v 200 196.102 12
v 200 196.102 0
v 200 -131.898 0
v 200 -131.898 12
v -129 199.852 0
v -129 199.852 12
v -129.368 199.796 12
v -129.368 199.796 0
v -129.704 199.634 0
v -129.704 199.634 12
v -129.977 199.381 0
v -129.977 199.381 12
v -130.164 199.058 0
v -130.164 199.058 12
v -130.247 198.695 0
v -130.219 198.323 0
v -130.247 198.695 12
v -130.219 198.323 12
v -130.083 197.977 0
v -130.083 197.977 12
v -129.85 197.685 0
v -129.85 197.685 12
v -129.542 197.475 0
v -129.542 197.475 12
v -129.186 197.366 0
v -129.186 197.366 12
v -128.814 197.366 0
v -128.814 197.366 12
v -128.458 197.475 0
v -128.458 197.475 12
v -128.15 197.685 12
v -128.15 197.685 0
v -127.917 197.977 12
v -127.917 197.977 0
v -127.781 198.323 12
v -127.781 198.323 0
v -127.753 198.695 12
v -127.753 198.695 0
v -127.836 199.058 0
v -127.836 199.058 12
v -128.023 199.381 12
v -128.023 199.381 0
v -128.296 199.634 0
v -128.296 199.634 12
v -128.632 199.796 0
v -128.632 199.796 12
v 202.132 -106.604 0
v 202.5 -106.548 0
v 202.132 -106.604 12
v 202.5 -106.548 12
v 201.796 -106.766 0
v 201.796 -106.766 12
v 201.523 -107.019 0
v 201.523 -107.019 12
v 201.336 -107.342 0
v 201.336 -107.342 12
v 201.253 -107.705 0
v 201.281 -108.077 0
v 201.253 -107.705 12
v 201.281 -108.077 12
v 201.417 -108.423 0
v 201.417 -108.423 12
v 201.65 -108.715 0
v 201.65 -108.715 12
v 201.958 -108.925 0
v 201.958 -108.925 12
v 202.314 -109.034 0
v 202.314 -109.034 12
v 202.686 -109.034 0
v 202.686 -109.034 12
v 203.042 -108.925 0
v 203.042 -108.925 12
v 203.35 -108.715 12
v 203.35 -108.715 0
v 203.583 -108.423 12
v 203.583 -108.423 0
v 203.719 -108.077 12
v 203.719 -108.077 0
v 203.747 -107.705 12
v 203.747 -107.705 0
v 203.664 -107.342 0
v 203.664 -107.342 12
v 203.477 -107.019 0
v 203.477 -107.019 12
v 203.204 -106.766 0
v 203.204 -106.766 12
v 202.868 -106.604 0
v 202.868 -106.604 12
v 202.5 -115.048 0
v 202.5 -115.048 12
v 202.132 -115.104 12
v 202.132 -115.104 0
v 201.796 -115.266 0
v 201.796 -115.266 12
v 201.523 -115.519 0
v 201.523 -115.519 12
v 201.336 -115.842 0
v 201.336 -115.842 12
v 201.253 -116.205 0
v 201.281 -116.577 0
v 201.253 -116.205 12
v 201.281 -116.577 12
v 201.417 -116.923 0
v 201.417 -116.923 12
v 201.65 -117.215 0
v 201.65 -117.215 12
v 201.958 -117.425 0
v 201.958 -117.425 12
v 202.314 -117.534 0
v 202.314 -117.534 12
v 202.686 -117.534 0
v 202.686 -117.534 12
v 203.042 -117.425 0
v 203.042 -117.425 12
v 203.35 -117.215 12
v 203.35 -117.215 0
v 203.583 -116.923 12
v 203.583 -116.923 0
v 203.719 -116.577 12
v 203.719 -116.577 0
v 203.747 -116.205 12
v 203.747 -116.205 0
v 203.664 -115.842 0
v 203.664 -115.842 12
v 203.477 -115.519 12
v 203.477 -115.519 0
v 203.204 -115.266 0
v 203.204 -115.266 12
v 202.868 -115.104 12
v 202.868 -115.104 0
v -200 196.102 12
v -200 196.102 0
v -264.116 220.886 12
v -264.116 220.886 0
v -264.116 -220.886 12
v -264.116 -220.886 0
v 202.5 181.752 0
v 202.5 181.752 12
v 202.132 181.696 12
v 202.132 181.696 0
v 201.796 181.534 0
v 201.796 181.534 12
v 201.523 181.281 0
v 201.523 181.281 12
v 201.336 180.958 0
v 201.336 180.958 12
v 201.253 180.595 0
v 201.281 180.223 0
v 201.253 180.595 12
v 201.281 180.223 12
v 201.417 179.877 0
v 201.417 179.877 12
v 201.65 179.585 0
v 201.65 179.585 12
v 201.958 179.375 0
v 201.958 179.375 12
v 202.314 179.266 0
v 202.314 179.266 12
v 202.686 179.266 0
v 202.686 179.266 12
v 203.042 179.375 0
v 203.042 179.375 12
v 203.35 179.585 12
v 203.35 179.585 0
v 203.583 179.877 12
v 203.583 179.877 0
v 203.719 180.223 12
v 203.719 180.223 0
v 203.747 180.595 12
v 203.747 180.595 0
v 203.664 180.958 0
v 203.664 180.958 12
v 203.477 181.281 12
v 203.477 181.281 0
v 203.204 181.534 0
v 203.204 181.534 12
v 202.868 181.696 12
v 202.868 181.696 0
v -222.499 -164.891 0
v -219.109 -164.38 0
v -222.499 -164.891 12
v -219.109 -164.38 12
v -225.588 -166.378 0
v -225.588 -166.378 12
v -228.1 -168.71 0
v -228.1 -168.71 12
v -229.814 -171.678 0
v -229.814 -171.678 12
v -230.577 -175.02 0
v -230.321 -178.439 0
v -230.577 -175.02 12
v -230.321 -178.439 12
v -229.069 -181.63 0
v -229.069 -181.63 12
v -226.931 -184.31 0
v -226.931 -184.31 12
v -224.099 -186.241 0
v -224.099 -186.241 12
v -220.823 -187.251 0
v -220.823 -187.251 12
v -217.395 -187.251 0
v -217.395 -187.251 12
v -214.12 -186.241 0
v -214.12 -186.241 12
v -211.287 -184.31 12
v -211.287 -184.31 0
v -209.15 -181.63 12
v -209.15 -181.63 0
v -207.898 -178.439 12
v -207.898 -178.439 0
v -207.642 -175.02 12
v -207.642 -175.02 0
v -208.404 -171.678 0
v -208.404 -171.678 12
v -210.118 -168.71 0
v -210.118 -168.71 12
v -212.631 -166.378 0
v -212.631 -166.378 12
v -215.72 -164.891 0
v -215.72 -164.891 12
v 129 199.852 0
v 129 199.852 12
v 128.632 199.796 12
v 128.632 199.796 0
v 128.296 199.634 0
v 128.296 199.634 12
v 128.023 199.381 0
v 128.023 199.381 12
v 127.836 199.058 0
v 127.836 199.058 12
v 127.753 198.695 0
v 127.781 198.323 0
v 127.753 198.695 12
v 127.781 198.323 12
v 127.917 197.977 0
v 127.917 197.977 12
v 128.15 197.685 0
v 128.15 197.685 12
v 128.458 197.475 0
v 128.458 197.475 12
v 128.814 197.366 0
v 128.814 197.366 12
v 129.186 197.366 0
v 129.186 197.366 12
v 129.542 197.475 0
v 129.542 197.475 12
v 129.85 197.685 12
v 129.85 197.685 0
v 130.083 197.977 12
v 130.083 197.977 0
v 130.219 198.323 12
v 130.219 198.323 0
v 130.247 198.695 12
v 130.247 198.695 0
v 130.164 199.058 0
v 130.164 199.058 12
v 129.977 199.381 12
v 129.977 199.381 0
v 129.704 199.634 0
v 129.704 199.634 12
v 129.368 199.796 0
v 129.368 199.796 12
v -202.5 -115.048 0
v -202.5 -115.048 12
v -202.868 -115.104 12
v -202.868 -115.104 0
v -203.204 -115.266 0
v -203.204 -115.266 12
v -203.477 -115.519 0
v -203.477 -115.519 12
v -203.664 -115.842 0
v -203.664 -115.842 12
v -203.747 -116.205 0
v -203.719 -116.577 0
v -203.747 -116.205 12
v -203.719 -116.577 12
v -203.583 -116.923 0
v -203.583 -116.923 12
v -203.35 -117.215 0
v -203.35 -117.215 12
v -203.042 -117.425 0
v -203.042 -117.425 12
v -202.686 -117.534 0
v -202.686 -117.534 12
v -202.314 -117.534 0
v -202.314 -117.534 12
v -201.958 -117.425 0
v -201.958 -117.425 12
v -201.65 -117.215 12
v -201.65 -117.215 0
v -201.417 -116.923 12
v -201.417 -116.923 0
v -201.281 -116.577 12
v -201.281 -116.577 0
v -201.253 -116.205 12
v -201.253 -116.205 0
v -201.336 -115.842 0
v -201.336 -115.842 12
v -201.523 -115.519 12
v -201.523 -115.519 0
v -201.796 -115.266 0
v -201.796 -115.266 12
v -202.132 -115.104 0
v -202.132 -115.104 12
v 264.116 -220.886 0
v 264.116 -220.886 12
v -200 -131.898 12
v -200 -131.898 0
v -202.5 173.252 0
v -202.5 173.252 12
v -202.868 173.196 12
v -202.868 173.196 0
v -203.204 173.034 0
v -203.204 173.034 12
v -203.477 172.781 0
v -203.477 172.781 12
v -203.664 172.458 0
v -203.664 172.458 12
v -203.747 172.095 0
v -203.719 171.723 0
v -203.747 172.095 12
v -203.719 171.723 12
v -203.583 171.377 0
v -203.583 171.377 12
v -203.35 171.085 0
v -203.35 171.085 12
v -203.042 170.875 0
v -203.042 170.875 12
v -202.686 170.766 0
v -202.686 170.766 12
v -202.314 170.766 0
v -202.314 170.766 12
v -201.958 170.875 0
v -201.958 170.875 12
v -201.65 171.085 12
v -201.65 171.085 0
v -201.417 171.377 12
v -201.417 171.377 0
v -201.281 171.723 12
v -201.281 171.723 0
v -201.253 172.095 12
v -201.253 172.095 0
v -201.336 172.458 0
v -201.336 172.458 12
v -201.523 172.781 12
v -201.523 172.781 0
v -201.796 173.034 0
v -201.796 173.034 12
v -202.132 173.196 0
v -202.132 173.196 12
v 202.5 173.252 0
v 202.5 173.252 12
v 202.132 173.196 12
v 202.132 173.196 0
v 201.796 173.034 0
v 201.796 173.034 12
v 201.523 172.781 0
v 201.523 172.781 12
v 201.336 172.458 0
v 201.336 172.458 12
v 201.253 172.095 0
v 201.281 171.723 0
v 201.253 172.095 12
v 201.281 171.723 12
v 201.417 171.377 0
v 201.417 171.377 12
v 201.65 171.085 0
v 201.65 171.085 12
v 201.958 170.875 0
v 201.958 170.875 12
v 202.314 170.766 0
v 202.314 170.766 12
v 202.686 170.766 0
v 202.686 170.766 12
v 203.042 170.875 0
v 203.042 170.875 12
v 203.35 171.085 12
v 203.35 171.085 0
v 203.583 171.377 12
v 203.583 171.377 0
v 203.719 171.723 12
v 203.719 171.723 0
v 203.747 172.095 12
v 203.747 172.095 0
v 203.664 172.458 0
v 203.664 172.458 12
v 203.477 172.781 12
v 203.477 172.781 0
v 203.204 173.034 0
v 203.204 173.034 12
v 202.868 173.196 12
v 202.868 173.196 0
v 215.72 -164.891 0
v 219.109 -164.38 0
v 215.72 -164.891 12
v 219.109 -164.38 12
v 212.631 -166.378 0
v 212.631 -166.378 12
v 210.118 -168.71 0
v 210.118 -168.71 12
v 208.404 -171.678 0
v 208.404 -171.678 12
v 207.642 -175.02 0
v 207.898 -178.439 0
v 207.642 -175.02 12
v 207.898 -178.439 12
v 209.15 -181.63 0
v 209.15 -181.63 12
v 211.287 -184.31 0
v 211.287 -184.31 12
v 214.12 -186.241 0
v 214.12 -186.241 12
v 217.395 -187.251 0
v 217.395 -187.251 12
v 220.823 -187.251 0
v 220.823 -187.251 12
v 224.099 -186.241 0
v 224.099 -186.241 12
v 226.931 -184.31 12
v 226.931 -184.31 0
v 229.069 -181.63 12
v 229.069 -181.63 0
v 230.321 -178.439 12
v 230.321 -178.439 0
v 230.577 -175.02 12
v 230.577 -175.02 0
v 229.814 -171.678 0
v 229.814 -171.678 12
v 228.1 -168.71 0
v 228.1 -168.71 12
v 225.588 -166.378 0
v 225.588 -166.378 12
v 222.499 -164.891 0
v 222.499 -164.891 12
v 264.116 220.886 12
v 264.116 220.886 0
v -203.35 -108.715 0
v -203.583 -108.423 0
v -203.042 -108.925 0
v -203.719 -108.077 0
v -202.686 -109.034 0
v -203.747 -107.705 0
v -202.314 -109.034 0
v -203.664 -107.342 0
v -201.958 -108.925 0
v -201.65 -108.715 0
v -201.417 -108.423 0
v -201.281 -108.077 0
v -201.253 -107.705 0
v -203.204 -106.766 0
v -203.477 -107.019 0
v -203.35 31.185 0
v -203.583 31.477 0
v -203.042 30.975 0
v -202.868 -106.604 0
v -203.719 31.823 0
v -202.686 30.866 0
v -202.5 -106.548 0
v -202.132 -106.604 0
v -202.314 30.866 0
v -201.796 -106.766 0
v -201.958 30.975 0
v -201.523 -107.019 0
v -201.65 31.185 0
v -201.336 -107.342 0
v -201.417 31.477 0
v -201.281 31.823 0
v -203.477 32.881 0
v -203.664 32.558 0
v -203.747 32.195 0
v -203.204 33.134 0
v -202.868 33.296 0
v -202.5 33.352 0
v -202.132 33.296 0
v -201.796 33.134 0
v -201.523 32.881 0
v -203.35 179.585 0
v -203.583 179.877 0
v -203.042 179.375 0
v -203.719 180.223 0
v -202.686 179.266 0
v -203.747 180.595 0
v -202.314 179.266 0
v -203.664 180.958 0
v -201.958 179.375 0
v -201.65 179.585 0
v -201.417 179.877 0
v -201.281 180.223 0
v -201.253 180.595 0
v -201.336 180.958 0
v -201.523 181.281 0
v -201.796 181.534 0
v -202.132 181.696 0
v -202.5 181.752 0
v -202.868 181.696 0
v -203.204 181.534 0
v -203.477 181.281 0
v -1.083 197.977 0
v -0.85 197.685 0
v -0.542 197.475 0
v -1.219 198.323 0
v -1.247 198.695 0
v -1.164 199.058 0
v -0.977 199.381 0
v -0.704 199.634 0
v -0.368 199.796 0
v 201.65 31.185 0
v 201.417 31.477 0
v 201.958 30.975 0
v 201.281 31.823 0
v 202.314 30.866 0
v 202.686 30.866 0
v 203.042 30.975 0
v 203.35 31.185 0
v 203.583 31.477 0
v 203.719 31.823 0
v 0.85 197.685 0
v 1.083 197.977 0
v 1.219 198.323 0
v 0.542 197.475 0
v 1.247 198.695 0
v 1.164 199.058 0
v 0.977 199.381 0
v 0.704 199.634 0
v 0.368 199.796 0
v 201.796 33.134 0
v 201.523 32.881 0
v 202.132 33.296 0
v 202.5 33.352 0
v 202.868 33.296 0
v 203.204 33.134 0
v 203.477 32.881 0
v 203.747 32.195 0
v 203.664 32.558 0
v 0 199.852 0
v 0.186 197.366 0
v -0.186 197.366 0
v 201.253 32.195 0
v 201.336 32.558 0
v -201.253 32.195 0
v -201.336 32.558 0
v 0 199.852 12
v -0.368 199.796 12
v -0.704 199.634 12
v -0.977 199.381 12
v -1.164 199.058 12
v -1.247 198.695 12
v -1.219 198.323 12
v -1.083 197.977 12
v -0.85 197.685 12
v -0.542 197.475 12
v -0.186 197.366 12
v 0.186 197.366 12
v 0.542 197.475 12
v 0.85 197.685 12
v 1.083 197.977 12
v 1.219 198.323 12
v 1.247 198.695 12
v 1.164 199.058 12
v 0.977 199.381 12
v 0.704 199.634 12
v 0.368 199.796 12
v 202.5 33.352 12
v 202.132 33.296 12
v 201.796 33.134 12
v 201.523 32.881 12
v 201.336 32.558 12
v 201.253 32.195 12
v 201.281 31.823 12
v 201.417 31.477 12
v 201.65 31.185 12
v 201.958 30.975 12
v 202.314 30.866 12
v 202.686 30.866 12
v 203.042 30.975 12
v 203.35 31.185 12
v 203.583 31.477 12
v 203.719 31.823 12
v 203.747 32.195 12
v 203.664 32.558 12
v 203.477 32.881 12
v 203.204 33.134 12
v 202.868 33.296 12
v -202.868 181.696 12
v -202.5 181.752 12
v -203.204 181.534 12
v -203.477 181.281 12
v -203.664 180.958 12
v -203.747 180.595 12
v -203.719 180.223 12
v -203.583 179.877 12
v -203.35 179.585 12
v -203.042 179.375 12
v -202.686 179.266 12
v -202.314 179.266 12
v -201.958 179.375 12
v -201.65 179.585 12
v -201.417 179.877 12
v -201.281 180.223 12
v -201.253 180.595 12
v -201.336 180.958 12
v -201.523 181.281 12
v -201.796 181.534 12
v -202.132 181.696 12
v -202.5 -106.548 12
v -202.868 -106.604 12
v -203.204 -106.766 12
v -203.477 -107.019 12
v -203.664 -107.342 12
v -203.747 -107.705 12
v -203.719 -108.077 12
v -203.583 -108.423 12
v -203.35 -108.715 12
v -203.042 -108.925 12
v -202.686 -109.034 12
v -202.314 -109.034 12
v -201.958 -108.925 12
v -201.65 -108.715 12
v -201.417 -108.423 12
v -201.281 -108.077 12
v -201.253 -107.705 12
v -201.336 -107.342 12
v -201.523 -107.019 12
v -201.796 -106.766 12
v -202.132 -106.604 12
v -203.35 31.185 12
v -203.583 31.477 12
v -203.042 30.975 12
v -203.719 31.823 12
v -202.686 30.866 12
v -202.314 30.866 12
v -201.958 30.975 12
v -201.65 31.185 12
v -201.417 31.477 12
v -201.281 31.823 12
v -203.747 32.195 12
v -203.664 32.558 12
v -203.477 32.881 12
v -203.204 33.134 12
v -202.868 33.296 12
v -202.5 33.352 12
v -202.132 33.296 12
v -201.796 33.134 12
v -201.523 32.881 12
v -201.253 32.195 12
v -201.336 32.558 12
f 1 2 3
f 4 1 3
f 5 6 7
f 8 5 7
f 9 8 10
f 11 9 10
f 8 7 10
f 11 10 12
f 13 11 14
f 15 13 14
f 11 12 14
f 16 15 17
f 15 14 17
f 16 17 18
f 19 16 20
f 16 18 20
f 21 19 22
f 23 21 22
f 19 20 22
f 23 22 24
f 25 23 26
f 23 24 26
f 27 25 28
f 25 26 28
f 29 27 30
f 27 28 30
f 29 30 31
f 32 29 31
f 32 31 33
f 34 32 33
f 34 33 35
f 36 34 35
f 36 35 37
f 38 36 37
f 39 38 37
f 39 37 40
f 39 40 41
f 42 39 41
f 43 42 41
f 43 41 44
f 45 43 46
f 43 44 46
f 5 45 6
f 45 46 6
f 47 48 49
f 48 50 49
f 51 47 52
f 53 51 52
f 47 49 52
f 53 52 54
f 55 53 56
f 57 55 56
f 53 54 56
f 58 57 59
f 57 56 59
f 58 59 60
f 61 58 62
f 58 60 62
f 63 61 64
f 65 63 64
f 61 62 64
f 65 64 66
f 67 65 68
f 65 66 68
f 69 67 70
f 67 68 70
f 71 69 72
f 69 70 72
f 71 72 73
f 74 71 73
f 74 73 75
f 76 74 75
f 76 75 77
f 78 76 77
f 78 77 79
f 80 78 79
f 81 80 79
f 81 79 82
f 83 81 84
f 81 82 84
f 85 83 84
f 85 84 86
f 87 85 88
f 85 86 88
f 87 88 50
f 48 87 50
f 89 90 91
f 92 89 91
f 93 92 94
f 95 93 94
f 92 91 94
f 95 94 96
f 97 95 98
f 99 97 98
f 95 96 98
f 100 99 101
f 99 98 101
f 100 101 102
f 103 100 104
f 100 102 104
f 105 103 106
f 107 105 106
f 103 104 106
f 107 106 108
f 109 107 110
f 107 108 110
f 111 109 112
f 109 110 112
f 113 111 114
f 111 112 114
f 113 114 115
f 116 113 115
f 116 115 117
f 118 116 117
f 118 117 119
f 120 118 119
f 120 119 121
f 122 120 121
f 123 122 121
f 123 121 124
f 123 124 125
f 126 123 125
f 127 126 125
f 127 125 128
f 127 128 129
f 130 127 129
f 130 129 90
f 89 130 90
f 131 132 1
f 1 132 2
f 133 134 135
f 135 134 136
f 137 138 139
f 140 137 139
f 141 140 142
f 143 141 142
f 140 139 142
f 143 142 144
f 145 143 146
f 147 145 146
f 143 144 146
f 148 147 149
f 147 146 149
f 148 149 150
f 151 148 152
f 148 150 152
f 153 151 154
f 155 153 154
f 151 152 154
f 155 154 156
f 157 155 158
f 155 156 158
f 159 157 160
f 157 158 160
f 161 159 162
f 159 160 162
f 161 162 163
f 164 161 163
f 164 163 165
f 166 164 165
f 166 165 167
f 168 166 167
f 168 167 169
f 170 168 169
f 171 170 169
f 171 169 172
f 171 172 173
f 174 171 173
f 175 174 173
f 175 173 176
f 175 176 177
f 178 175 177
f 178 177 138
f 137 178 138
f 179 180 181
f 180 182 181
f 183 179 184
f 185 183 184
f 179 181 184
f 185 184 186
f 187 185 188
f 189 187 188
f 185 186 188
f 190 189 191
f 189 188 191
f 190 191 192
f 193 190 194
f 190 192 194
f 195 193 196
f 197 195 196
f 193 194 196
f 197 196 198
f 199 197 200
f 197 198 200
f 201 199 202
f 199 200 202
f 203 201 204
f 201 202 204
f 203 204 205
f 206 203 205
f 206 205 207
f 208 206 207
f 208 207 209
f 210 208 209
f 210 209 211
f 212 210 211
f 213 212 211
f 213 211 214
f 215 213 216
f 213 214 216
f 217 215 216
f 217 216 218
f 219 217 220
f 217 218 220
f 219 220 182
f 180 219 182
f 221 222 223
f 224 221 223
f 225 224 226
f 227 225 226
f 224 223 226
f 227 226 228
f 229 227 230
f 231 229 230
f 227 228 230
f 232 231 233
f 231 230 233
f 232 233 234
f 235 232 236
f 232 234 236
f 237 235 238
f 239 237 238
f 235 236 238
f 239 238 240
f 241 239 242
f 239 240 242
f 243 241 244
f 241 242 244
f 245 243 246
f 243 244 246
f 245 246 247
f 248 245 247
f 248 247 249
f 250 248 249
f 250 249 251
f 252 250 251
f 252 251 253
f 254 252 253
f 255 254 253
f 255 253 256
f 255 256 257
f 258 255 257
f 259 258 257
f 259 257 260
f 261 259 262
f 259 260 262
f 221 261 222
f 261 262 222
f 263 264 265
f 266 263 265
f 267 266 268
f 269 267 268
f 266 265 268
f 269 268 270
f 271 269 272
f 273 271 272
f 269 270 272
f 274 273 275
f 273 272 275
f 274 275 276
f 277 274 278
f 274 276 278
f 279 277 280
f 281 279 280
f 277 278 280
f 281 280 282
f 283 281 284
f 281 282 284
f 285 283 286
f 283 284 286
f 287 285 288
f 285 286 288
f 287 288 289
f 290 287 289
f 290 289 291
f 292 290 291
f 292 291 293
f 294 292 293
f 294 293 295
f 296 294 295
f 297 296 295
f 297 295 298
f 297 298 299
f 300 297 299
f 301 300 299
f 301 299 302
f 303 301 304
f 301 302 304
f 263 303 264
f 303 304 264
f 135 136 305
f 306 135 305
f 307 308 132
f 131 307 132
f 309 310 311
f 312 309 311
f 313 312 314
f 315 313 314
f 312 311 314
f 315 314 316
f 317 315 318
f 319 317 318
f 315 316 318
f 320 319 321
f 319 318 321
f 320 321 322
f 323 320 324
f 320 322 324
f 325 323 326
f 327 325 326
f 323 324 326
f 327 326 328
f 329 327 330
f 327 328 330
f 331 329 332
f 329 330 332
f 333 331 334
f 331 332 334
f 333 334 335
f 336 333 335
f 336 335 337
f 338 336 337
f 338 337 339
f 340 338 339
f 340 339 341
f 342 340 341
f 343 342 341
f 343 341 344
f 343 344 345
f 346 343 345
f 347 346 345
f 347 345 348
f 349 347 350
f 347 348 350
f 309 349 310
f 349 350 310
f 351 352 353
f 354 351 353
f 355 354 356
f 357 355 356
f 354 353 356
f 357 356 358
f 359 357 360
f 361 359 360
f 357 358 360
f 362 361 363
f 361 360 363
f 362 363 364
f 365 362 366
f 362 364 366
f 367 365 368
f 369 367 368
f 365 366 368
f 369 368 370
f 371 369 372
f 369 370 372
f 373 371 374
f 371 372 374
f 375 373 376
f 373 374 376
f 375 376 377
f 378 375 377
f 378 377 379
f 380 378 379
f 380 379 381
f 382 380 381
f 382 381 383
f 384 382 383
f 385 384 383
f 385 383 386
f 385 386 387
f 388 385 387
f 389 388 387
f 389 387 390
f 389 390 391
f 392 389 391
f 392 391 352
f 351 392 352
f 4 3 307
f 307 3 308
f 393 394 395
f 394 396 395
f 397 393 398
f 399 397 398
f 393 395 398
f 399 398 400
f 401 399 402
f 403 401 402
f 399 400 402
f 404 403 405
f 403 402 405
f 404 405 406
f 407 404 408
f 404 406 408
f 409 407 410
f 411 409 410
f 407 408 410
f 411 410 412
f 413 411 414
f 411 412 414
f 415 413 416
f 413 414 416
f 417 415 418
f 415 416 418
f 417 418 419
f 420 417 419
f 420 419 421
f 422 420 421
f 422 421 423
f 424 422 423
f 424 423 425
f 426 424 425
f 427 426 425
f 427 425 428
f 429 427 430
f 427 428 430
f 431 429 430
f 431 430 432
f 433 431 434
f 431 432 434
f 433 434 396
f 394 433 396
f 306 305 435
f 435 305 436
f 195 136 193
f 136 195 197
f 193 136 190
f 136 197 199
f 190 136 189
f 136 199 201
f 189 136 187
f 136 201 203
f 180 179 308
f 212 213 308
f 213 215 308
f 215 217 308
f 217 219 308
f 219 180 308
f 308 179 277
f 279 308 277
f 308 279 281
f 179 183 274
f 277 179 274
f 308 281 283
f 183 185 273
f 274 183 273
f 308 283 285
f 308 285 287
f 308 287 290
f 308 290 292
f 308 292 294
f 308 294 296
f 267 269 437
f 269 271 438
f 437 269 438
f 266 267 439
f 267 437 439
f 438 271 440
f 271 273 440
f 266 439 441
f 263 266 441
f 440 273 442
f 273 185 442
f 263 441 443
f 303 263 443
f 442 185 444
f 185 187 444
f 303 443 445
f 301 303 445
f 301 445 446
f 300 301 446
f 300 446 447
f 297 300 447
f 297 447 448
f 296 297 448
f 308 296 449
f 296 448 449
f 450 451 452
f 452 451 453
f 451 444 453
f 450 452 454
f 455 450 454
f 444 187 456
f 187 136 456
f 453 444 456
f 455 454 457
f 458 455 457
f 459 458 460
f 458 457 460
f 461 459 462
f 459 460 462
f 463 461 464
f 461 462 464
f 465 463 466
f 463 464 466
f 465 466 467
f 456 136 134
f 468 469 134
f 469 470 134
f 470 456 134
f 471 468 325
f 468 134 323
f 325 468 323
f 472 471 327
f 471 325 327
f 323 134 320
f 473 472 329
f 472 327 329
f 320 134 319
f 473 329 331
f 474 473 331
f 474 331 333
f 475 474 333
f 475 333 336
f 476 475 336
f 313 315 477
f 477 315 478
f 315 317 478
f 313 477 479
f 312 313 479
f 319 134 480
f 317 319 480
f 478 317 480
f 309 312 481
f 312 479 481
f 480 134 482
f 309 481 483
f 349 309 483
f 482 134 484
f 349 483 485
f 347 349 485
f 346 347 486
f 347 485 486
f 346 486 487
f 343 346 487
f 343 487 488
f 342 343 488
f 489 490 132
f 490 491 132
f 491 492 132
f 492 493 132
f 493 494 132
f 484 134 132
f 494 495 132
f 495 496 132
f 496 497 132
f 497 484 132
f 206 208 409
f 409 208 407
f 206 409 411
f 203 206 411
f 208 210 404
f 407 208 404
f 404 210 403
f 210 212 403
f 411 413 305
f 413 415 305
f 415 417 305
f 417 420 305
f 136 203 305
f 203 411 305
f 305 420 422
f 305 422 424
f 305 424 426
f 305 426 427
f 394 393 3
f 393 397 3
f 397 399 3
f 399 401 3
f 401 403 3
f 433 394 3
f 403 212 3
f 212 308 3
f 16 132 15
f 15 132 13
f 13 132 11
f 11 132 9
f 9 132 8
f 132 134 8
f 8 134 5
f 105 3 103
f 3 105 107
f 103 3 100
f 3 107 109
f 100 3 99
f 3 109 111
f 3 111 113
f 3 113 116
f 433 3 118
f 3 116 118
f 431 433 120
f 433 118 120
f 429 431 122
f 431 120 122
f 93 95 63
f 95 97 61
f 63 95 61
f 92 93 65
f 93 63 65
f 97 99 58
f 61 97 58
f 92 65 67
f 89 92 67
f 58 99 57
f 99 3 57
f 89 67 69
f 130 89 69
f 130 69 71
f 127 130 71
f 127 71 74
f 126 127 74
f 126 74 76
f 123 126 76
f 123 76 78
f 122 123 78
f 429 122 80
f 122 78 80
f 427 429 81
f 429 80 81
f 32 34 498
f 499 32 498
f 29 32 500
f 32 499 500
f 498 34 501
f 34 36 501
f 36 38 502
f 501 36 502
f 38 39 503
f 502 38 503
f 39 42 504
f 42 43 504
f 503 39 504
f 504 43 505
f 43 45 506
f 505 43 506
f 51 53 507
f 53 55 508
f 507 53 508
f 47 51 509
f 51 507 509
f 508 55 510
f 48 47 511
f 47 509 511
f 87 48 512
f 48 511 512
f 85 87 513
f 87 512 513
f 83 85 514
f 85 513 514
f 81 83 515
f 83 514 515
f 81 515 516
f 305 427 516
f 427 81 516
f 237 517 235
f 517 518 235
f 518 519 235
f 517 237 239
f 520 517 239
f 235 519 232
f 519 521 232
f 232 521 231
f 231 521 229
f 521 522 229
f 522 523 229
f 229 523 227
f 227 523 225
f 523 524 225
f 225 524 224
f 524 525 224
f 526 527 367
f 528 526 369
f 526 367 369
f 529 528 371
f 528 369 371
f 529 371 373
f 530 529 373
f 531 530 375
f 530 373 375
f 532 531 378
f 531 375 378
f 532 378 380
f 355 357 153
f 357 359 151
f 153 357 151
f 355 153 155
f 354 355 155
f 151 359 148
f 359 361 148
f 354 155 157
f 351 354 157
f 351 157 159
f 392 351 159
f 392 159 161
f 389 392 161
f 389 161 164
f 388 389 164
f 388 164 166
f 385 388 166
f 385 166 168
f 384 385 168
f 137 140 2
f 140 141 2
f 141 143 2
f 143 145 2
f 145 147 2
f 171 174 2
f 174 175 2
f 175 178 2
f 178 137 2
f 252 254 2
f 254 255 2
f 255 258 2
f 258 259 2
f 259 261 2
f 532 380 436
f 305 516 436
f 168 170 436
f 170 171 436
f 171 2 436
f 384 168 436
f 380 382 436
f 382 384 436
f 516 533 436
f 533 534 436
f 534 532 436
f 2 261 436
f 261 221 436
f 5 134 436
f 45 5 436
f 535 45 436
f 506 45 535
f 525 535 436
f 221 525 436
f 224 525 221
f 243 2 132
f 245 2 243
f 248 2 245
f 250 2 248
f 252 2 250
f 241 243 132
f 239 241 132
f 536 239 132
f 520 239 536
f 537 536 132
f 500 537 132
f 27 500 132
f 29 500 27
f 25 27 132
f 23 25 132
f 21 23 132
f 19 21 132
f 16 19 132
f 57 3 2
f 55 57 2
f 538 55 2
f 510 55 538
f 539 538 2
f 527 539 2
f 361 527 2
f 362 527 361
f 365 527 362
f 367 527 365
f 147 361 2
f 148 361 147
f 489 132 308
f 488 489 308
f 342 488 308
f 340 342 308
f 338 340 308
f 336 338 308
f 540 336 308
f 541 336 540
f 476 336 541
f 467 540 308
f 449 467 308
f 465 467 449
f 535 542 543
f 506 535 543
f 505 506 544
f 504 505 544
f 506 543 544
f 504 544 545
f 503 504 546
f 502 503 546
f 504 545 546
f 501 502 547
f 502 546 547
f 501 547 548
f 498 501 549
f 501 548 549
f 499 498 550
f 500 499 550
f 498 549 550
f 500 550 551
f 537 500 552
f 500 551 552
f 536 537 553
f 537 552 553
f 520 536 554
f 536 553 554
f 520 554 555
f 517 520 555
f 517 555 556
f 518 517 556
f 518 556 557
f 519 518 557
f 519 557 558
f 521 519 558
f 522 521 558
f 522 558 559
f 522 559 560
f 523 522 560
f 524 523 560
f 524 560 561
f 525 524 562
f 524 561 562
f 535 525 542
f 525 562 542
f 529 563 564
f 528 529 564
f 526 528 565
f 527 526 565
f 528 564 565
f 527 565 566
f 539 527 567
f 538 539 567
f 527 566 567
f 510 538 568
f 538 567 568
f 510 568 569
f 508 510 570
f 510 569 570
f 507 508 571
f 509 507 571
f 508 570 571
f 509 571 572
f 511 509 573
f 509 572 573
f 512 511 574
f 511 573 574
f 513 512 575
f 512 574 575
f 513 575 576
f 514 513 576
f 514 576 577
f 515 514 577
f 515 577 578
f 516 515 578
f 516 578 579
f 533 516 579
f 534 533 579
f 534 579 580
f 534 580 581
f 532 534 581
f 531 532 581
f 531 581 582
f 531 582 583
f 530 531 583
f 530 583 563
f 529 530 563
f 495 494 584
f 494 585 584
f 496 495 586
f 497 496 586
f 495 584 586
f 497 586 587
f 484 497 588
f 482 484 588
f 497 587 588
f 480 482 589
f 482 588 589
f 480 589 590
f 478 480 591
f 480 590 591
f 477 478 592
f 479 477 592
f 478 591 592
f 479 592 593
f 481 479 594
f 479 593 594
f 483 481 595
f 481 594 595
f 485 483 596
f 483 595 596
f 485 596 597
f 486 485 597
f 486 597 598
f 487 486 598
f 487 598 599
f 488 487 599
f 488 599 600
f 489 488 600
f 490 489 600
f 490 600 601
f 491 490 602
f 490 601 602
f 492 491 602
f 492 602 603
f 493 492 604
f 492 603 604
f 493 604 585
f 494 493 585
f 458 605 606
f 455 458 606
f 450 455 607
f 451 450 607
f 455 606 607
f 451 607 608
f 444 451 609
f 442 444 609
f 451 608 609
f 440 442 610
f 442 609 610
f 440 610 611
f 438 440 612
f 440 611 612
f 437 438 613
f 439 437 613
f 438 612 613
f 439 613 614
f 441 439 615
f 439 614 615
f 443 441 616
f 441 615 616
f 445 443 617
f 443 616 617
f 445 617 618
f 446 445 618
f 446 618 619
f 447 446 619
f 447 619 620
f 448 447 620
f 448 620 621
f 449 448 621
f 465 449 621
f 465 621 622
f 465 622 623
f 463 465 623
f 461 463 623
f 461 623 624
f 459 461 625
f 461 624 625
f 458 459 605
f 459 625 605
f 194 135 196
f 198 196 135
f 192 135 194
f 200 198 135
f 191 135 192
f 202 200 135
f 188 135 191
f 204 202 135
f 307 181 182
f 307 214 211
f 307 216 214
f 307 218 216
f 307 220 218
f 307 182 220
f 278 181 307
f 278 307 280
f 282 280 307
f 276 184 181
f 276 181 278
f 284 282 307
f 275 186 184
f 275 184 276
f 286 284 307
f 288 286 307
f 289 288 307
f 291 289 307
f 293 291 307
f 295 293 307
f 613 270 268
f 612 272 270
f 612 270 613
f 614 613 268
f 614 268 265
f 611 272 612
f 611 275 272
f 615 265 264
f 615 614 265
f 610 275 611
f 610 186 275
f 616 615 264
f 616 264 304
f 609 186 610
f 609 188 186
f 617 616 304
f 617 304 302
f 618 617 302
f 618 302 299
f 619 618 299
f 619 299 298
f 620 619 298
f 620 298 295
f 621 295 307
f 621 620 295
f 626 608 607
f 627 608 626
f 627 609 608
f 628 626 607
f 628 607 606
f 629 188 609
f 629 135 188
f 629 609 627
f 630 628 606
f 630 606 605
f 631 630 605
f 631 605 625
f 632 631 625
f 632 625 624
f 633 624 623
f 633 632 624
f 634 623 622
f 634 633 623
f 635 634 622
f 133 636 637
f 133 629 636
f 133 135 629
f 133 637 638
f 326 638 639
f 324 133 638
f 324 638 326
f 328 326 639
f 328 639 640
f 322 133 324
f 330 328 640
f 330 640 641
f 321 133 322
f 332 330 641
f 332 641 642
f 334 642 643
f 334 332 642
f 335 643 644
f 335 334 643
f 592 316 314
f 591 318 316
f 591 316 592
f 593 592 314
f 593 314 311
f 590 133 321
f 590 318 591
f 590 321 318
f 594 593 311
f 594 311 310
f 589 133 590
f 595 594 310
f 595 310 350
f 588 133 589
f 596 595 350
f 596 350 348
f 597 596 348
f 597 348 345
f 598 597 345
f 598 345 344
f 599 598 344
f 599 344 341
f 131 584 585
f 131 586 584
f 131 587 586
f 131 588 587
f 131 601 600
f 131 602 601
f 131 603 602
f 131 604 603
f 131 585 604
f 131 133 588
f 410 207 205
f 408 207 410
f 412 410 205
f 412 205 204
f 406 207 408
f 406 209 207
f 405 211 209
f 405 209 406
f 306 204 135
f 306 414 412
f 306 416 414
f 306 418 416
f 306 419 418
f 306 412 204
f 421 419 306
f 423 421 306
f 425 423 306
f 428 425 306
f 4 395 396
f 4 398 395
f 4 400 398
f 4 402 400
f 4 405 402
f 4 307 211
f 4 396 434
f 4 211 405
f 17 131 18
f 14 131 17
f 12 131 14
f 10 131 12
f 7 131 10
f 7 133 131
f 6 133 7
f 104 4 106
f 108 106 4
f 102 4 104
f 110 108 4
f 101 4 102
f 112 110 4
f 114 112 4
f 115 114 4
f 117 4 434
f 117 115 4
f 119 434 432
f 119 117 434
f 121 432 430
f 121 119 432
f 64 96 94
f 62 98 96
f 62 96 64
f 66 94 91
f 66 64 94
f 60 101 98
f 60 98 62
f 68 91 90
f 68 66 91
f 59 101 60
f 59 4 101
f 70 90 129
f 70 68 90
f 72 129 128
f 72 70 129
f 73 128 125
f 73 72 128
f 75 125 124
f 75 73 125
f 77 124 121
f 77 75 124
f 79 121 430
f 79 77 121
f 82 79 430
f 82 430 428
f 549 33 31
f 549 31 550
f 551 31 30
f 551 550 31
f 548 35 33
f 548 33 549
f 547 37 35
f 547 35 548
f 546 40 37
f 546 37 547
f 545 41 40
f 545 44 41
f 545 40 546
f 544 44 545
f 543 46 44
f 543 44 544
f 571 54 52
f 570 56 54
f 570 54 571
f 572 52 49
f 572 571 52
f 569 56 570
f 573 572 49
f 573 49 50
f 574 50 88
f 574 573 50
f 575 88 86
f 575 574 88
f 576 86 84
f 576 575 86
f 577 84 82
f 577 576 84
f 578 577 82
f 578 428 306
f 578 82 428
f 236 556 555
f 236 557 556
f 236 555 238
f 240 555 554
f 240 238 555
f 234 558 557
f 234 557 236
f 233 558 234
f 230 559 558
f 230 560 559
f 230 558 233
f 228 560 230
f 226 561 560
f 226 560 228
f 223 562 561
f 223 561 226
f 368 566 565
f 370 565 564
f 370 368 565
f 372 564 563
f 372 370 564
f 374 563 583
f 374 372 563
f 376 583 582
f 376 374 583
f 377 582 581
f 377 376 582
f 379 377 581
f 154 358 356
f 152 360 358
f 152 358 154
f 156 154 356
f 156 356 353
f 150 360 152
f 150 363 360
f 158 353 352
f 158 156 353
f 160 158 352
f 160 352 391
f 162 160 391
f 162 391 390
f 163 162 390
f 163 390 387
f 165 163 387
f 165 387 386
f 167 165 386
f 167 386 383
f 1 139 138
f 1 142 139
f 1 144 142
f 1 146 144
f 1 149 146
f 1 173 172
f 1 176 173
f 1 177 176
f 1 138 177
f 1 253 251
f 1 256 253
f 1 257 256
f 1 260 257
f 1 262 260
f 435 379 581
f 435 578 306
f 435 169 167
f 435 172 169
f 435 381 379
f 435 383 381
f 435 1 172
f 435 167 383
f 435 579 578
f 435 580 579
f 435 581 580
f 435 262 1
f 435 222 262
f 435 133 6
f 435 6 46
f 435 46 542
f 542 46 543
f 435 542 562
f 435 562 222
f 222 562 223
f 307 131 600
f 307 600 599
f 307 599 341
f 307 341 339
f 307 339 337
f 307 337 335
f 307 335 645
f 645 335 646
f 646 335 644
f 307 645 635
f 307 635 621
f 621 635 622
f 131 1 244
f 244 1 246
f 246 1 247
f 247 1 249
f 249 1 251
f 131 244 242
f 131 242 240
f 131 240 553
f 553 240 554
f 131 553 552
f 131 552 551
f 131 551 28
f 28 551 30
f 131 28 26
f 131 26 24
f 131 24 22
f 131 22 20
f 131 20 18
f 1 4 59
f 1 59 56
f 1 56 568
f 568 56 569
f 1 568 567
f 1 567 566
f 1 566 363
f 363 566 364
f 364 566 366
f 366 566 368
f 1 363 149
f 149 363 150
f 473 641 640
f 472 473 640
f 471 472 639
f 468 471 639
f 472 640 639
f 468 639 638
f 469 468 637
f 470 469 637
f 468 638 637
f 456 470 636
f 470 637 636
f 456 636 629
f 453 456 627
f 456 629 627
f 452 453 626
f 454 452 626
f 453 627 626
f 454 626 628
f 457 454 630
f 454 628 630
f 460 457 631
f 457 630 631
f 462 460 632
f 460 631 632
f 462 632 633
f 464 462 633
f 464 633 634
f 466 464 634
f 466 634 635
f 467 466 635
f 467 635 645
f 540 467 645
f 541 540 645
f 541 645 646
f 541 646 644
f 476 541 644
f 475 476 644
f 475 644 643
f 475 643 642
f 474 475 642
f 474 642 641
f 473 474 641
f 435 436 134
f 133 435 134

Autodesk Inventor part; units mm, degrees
ref_plane "YZ Plane" through (0, 0, 0) normal (1, 0, 0) x (0, 1, 0)
ref_plane "XZ Plane" through (0, 0, 0) normal (0, 1, 0) x (-1, 0, 0)
ref_plane "XY Plane" through (0, 0, 0) normal (0, 0, 1) x (1, 0, 0)
sketch "Sketch1" plane through (0, 0, 0) normal (0, 0, 1) x (1, 0, 0)
  line L0 (199, 195.1016) -> (-199, 195.1016) projected
  line L1 (-199, 195.1016) -> (-199, -130.8984) projected
  line L2 (-199, -130.8984) -> (199, -130.8984) projected
  line L3 (199, -130.8984) -> (199, 195.1016) projected
  line L4 (-264.1156, 220.8859) -> (-264.1156, -220.8859) projected
  line L5 (-264.1156, -220.8859) -> (264.1156, -220.8859) projected
  line L6 (264.1156, -220.8859) -> (264.1156, 220.8859) projected
  line L7 (264.1156, 220.8859) -> (-264.1156, 220.8859) projected
  line L8 (-200, 196.1016) -> (200, 196.1016)
  line L9 (200, 196.1016) -> (200, -131.8984)
  line L10 (200, -131.8984) -> (-200, -131.8984)
  line L11 (-200, -131.8984) -> (-200, 196.1016)
  point P0 (0, 0)
  dimension "d0" = 1
extrude "Extrusion1" add sketch "Sketch1" along normal blind 12 contours L7 L6 L5 L4
sketch "Sketch2" plane through (0, 0, 0) normal (0, 0, -1) x (-1, 0, 0)
  point P0 (0, 0)
  point P1 (-219.1094, -175.8797)
  point P2 (219.1094, -175.8797)
hole "Hole1" at (219.1094, -175.8797, 0) at (-219.1094, -175.8797, 0) direction (0, 0, 1) diameter 23 end through all
sketch "Sketch3" plane through (0, 0, 0) normal (0, 0, -1) x (-1, 0, 0)
  circle A0 centre (-202.5, 180.5016) radius 3 projected
  circle A1 centre (-202.5, 172.0016) radius 2 projected
  line L0 (199, 195.1016) -> (-199, 195.1016) projected
  circle A2 centre (-129, 198.6016) radius 2 projected
  circle A3 centre (0, 198.6016) radius 2 projected
  circle A4 centre (129, 198.6016) radius 2 projected
  circle A5 centre (202.5, 180.5016) radius 3 projected
  circle A6 centre (202.5, 172.0016) radius 2 projected
  line L1 (199, -130.8984) -> (199, 195.1016) projected
  circle A7 centre (202.5, 32.1016) radius 2 projected
  line L2 (199, -130.8984) -> (199, 195.1016) projected
  circle A8 centre (202.5, -107.7984) radius 2 projected
  circle A9 centre (202.5, -116.2984) radius 3 projected
  circle A10 centre (-202.5, -116.2984) radius 3 projected
  circle A11 centre (-202.5, -107.7984) radius 2 projected
  circle A12 centre (-202.5, 32.1016) radius 2 projected
  point P0 (0, 0)
hole "Hole2" at (202.5, 180.5016, 0) at (202.5, 172.0016, 0) at (129, 198.6016, 0) at (0, 198.6016, 0) at (-129, 198.6016, 0) at (-202.5, 180.5016, 0) at (-202.5, 172.0016, 0) at (202.5, 32.1016, 0) at (202.5, -116.2984, 0) at (202.5, -107.7984, 0) at (-202.5, -116.2984, 0) at (-202.5, 32.1016, 0) at (-202.5, -107.7984, 0) direction (0, 0, 1) diameter 2.5 end through all
properties part number "lag2"
